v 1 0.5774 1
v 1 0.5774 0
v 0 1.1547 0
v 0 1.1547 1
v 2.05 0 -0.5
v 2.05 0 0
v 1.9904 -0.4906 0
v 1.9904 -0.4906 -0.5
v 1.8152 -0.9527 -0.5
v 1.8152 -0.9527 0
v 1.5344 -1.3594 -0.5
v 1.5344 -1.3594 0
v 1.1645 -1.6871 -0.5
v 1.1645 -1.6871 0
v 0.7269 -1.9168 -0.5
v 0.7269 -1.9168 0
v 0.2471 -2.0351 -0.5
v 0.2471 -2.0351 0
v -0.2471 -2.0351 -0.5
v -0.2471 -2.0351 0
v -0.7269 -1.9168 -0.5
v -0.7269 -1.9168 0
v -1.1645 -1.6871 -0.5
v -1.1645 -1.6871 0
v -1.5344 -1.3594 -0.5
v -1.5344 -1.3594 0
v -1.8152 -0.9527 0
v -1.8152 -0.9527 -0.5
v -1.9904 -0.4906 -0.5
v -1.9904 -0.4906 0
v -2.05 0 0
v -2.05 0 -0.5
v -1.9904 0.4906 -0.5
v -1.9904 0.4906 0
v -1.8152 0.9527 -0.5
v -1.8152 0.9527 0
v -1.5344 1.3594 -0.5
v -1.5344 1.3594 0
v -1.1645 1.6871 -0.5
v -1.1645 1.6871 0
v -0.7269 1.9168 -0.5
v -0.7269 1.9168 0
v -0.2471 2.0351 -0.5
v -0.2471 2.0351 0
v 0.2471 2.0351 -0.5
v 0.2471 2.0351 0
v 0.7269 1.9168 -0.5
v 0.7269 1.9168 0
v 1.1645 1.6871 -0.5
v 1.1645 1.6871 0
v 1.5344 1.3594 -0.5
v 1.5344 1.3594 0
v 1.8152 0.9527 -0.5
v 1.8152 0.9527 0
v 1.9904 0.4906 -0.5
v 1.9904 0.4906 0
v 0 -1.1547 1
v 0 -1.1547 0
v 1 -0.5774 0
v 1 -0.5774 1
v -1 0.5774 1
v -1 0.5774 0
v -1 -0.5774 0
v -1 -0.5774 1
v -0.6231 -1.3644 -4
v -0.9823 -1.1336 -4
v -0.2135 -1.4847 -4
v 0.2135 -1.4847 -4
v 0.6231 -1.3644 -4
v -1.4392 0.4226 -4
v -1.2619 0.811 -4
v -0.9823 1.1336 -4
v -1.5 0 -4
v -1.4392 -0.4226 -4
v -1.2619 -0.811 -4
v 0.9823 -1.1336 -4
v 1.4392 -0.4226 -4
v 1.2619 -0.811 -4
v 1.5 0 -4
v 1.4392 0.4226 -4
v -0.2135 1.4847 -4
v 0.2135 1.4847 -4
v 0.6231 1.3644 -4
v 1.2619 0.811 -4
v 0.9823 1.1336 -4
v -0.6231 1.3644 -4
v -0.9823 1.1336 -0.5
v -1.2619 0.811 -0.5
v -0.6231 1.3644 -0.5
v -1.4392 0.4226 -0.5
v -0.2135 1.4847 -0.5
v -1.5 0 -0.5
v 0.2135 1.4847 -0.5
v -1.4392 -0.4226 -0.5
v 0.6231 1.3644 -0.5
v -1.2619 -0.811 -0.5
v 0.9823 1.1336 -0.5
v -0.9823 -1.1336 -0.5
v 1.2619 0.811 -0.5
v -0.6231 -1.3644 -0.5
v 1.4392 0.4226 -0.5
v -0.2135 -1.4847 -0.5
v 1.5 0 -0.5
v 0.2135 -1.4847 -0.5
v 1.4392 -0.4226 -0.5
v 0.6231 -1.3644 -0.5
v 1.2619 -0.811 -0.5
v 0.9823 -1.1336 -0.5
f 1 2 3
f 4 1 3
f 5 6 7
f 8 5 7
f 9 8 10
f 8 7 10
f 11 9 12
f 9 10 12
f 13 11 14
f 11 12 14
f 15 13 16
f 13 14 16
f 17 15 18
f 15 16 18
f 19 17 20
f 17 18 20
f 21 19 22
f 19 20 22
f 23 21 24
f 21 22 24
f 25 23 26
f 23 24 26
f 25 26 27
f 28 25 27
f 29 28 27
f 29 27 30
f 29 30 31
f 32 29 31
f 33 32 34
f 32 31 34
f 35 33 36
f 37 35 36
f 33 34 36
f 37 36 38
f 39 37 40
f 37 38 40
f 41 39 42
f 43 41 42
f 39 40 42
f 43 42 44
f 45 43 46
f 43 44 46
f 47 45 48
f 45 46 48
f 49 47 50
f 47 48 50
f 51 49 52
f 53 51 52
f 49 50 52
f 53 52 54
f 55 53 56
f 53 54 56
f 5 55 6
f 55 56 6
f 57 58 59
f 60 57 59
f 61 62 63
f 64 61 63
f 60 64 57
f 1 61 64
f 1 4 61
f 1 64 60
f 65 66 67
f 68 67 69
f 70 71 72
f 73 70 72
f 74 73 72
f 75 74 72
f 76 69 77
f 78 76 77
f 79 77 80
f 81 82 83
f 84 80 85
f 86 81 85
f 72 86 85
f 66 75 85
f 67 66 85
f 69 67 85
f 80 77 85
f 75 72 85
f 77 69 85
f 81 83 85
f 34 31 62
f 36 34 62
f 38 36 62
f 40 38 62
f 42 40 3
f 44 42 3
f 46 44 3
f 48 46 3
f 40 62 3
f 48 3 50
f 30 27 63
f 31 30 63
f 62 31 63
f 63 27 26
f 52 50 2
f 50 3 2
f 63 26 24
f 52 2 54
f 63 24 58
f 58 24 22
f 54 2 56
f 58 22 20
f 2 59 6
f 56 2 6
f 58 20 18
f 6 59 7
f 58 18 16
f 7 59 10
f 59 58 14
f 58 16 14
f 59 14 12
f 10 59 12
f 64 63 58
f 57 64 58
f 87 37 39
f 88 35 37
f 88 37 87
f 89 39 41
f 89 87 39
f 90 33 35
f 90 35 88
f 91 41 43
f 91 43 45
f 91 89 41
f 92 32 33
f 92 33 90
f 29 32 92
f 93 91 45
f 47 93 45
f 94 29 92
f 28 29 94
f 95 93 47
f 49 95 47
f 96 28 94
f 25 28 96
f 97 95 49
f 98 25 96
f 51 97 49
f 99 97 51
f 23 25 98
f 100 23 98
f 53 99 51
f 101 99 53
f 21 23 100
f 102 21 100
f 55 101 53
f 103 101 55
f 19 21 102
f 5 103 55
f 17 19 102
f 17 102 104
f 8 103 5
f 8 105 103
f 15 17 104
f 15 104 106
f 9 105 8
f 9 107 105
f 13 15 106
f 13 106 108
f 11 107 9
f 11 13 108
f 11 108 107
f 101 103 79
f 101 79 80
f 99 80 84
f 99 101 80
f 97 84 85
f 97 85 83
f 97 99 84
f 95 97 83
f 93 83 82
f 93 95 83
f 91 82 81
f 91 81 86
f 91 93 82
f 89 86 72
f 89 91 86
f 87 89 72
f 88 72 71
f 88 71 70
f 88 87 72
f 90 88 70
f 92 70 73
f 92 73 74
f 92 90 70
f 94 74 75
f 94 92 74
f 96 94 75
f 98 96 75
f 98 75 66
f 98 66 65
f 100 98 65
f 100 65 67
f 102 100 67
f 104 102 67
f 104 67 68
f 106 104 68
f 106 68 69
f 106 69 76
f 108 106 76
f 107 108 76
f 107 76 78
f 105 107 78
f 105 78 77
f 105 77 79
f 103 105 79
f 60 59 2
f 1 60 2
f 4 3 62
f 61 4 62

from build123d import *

# Parameters (mm, degrees)
F1_DEPTH = 1
F2_R     = 2.05
F3_DEPTH = 0.5
F4_R     = 1.5
F5_DEPTH = 4


with BuildPart() as f1:
    # F0 (on Top) → F1 (new body)
    with BuildSketch(Plane.XY):
        Polygon((-1, 0.57735), (-1, 0), (1, 0), (1, 0.57735), (0, 1.154701), align=None)
        Polygon((1, 0), (-1, 0), (-1, -0.57735), (0, -1.154701), (1, -0.57735), align=None)
    extrude(amount=F1_DEPTH)

    # F2 (on face) → F3 (join)
    with BuildSketch(Plane(origin=(0, 0, 0), x_dir=(1, 0, 0), z_dir=(0, 0, -1))):
        Circle(F2_R)
    extrude(amount=F3_DEPTH)

    # F4 (on Top) → F5 (join)
    with BuildSketch(Plane.XY):
        Circle(F4_R)
    extrude(amount=-F5_DEPTH)


solid = f1.part
